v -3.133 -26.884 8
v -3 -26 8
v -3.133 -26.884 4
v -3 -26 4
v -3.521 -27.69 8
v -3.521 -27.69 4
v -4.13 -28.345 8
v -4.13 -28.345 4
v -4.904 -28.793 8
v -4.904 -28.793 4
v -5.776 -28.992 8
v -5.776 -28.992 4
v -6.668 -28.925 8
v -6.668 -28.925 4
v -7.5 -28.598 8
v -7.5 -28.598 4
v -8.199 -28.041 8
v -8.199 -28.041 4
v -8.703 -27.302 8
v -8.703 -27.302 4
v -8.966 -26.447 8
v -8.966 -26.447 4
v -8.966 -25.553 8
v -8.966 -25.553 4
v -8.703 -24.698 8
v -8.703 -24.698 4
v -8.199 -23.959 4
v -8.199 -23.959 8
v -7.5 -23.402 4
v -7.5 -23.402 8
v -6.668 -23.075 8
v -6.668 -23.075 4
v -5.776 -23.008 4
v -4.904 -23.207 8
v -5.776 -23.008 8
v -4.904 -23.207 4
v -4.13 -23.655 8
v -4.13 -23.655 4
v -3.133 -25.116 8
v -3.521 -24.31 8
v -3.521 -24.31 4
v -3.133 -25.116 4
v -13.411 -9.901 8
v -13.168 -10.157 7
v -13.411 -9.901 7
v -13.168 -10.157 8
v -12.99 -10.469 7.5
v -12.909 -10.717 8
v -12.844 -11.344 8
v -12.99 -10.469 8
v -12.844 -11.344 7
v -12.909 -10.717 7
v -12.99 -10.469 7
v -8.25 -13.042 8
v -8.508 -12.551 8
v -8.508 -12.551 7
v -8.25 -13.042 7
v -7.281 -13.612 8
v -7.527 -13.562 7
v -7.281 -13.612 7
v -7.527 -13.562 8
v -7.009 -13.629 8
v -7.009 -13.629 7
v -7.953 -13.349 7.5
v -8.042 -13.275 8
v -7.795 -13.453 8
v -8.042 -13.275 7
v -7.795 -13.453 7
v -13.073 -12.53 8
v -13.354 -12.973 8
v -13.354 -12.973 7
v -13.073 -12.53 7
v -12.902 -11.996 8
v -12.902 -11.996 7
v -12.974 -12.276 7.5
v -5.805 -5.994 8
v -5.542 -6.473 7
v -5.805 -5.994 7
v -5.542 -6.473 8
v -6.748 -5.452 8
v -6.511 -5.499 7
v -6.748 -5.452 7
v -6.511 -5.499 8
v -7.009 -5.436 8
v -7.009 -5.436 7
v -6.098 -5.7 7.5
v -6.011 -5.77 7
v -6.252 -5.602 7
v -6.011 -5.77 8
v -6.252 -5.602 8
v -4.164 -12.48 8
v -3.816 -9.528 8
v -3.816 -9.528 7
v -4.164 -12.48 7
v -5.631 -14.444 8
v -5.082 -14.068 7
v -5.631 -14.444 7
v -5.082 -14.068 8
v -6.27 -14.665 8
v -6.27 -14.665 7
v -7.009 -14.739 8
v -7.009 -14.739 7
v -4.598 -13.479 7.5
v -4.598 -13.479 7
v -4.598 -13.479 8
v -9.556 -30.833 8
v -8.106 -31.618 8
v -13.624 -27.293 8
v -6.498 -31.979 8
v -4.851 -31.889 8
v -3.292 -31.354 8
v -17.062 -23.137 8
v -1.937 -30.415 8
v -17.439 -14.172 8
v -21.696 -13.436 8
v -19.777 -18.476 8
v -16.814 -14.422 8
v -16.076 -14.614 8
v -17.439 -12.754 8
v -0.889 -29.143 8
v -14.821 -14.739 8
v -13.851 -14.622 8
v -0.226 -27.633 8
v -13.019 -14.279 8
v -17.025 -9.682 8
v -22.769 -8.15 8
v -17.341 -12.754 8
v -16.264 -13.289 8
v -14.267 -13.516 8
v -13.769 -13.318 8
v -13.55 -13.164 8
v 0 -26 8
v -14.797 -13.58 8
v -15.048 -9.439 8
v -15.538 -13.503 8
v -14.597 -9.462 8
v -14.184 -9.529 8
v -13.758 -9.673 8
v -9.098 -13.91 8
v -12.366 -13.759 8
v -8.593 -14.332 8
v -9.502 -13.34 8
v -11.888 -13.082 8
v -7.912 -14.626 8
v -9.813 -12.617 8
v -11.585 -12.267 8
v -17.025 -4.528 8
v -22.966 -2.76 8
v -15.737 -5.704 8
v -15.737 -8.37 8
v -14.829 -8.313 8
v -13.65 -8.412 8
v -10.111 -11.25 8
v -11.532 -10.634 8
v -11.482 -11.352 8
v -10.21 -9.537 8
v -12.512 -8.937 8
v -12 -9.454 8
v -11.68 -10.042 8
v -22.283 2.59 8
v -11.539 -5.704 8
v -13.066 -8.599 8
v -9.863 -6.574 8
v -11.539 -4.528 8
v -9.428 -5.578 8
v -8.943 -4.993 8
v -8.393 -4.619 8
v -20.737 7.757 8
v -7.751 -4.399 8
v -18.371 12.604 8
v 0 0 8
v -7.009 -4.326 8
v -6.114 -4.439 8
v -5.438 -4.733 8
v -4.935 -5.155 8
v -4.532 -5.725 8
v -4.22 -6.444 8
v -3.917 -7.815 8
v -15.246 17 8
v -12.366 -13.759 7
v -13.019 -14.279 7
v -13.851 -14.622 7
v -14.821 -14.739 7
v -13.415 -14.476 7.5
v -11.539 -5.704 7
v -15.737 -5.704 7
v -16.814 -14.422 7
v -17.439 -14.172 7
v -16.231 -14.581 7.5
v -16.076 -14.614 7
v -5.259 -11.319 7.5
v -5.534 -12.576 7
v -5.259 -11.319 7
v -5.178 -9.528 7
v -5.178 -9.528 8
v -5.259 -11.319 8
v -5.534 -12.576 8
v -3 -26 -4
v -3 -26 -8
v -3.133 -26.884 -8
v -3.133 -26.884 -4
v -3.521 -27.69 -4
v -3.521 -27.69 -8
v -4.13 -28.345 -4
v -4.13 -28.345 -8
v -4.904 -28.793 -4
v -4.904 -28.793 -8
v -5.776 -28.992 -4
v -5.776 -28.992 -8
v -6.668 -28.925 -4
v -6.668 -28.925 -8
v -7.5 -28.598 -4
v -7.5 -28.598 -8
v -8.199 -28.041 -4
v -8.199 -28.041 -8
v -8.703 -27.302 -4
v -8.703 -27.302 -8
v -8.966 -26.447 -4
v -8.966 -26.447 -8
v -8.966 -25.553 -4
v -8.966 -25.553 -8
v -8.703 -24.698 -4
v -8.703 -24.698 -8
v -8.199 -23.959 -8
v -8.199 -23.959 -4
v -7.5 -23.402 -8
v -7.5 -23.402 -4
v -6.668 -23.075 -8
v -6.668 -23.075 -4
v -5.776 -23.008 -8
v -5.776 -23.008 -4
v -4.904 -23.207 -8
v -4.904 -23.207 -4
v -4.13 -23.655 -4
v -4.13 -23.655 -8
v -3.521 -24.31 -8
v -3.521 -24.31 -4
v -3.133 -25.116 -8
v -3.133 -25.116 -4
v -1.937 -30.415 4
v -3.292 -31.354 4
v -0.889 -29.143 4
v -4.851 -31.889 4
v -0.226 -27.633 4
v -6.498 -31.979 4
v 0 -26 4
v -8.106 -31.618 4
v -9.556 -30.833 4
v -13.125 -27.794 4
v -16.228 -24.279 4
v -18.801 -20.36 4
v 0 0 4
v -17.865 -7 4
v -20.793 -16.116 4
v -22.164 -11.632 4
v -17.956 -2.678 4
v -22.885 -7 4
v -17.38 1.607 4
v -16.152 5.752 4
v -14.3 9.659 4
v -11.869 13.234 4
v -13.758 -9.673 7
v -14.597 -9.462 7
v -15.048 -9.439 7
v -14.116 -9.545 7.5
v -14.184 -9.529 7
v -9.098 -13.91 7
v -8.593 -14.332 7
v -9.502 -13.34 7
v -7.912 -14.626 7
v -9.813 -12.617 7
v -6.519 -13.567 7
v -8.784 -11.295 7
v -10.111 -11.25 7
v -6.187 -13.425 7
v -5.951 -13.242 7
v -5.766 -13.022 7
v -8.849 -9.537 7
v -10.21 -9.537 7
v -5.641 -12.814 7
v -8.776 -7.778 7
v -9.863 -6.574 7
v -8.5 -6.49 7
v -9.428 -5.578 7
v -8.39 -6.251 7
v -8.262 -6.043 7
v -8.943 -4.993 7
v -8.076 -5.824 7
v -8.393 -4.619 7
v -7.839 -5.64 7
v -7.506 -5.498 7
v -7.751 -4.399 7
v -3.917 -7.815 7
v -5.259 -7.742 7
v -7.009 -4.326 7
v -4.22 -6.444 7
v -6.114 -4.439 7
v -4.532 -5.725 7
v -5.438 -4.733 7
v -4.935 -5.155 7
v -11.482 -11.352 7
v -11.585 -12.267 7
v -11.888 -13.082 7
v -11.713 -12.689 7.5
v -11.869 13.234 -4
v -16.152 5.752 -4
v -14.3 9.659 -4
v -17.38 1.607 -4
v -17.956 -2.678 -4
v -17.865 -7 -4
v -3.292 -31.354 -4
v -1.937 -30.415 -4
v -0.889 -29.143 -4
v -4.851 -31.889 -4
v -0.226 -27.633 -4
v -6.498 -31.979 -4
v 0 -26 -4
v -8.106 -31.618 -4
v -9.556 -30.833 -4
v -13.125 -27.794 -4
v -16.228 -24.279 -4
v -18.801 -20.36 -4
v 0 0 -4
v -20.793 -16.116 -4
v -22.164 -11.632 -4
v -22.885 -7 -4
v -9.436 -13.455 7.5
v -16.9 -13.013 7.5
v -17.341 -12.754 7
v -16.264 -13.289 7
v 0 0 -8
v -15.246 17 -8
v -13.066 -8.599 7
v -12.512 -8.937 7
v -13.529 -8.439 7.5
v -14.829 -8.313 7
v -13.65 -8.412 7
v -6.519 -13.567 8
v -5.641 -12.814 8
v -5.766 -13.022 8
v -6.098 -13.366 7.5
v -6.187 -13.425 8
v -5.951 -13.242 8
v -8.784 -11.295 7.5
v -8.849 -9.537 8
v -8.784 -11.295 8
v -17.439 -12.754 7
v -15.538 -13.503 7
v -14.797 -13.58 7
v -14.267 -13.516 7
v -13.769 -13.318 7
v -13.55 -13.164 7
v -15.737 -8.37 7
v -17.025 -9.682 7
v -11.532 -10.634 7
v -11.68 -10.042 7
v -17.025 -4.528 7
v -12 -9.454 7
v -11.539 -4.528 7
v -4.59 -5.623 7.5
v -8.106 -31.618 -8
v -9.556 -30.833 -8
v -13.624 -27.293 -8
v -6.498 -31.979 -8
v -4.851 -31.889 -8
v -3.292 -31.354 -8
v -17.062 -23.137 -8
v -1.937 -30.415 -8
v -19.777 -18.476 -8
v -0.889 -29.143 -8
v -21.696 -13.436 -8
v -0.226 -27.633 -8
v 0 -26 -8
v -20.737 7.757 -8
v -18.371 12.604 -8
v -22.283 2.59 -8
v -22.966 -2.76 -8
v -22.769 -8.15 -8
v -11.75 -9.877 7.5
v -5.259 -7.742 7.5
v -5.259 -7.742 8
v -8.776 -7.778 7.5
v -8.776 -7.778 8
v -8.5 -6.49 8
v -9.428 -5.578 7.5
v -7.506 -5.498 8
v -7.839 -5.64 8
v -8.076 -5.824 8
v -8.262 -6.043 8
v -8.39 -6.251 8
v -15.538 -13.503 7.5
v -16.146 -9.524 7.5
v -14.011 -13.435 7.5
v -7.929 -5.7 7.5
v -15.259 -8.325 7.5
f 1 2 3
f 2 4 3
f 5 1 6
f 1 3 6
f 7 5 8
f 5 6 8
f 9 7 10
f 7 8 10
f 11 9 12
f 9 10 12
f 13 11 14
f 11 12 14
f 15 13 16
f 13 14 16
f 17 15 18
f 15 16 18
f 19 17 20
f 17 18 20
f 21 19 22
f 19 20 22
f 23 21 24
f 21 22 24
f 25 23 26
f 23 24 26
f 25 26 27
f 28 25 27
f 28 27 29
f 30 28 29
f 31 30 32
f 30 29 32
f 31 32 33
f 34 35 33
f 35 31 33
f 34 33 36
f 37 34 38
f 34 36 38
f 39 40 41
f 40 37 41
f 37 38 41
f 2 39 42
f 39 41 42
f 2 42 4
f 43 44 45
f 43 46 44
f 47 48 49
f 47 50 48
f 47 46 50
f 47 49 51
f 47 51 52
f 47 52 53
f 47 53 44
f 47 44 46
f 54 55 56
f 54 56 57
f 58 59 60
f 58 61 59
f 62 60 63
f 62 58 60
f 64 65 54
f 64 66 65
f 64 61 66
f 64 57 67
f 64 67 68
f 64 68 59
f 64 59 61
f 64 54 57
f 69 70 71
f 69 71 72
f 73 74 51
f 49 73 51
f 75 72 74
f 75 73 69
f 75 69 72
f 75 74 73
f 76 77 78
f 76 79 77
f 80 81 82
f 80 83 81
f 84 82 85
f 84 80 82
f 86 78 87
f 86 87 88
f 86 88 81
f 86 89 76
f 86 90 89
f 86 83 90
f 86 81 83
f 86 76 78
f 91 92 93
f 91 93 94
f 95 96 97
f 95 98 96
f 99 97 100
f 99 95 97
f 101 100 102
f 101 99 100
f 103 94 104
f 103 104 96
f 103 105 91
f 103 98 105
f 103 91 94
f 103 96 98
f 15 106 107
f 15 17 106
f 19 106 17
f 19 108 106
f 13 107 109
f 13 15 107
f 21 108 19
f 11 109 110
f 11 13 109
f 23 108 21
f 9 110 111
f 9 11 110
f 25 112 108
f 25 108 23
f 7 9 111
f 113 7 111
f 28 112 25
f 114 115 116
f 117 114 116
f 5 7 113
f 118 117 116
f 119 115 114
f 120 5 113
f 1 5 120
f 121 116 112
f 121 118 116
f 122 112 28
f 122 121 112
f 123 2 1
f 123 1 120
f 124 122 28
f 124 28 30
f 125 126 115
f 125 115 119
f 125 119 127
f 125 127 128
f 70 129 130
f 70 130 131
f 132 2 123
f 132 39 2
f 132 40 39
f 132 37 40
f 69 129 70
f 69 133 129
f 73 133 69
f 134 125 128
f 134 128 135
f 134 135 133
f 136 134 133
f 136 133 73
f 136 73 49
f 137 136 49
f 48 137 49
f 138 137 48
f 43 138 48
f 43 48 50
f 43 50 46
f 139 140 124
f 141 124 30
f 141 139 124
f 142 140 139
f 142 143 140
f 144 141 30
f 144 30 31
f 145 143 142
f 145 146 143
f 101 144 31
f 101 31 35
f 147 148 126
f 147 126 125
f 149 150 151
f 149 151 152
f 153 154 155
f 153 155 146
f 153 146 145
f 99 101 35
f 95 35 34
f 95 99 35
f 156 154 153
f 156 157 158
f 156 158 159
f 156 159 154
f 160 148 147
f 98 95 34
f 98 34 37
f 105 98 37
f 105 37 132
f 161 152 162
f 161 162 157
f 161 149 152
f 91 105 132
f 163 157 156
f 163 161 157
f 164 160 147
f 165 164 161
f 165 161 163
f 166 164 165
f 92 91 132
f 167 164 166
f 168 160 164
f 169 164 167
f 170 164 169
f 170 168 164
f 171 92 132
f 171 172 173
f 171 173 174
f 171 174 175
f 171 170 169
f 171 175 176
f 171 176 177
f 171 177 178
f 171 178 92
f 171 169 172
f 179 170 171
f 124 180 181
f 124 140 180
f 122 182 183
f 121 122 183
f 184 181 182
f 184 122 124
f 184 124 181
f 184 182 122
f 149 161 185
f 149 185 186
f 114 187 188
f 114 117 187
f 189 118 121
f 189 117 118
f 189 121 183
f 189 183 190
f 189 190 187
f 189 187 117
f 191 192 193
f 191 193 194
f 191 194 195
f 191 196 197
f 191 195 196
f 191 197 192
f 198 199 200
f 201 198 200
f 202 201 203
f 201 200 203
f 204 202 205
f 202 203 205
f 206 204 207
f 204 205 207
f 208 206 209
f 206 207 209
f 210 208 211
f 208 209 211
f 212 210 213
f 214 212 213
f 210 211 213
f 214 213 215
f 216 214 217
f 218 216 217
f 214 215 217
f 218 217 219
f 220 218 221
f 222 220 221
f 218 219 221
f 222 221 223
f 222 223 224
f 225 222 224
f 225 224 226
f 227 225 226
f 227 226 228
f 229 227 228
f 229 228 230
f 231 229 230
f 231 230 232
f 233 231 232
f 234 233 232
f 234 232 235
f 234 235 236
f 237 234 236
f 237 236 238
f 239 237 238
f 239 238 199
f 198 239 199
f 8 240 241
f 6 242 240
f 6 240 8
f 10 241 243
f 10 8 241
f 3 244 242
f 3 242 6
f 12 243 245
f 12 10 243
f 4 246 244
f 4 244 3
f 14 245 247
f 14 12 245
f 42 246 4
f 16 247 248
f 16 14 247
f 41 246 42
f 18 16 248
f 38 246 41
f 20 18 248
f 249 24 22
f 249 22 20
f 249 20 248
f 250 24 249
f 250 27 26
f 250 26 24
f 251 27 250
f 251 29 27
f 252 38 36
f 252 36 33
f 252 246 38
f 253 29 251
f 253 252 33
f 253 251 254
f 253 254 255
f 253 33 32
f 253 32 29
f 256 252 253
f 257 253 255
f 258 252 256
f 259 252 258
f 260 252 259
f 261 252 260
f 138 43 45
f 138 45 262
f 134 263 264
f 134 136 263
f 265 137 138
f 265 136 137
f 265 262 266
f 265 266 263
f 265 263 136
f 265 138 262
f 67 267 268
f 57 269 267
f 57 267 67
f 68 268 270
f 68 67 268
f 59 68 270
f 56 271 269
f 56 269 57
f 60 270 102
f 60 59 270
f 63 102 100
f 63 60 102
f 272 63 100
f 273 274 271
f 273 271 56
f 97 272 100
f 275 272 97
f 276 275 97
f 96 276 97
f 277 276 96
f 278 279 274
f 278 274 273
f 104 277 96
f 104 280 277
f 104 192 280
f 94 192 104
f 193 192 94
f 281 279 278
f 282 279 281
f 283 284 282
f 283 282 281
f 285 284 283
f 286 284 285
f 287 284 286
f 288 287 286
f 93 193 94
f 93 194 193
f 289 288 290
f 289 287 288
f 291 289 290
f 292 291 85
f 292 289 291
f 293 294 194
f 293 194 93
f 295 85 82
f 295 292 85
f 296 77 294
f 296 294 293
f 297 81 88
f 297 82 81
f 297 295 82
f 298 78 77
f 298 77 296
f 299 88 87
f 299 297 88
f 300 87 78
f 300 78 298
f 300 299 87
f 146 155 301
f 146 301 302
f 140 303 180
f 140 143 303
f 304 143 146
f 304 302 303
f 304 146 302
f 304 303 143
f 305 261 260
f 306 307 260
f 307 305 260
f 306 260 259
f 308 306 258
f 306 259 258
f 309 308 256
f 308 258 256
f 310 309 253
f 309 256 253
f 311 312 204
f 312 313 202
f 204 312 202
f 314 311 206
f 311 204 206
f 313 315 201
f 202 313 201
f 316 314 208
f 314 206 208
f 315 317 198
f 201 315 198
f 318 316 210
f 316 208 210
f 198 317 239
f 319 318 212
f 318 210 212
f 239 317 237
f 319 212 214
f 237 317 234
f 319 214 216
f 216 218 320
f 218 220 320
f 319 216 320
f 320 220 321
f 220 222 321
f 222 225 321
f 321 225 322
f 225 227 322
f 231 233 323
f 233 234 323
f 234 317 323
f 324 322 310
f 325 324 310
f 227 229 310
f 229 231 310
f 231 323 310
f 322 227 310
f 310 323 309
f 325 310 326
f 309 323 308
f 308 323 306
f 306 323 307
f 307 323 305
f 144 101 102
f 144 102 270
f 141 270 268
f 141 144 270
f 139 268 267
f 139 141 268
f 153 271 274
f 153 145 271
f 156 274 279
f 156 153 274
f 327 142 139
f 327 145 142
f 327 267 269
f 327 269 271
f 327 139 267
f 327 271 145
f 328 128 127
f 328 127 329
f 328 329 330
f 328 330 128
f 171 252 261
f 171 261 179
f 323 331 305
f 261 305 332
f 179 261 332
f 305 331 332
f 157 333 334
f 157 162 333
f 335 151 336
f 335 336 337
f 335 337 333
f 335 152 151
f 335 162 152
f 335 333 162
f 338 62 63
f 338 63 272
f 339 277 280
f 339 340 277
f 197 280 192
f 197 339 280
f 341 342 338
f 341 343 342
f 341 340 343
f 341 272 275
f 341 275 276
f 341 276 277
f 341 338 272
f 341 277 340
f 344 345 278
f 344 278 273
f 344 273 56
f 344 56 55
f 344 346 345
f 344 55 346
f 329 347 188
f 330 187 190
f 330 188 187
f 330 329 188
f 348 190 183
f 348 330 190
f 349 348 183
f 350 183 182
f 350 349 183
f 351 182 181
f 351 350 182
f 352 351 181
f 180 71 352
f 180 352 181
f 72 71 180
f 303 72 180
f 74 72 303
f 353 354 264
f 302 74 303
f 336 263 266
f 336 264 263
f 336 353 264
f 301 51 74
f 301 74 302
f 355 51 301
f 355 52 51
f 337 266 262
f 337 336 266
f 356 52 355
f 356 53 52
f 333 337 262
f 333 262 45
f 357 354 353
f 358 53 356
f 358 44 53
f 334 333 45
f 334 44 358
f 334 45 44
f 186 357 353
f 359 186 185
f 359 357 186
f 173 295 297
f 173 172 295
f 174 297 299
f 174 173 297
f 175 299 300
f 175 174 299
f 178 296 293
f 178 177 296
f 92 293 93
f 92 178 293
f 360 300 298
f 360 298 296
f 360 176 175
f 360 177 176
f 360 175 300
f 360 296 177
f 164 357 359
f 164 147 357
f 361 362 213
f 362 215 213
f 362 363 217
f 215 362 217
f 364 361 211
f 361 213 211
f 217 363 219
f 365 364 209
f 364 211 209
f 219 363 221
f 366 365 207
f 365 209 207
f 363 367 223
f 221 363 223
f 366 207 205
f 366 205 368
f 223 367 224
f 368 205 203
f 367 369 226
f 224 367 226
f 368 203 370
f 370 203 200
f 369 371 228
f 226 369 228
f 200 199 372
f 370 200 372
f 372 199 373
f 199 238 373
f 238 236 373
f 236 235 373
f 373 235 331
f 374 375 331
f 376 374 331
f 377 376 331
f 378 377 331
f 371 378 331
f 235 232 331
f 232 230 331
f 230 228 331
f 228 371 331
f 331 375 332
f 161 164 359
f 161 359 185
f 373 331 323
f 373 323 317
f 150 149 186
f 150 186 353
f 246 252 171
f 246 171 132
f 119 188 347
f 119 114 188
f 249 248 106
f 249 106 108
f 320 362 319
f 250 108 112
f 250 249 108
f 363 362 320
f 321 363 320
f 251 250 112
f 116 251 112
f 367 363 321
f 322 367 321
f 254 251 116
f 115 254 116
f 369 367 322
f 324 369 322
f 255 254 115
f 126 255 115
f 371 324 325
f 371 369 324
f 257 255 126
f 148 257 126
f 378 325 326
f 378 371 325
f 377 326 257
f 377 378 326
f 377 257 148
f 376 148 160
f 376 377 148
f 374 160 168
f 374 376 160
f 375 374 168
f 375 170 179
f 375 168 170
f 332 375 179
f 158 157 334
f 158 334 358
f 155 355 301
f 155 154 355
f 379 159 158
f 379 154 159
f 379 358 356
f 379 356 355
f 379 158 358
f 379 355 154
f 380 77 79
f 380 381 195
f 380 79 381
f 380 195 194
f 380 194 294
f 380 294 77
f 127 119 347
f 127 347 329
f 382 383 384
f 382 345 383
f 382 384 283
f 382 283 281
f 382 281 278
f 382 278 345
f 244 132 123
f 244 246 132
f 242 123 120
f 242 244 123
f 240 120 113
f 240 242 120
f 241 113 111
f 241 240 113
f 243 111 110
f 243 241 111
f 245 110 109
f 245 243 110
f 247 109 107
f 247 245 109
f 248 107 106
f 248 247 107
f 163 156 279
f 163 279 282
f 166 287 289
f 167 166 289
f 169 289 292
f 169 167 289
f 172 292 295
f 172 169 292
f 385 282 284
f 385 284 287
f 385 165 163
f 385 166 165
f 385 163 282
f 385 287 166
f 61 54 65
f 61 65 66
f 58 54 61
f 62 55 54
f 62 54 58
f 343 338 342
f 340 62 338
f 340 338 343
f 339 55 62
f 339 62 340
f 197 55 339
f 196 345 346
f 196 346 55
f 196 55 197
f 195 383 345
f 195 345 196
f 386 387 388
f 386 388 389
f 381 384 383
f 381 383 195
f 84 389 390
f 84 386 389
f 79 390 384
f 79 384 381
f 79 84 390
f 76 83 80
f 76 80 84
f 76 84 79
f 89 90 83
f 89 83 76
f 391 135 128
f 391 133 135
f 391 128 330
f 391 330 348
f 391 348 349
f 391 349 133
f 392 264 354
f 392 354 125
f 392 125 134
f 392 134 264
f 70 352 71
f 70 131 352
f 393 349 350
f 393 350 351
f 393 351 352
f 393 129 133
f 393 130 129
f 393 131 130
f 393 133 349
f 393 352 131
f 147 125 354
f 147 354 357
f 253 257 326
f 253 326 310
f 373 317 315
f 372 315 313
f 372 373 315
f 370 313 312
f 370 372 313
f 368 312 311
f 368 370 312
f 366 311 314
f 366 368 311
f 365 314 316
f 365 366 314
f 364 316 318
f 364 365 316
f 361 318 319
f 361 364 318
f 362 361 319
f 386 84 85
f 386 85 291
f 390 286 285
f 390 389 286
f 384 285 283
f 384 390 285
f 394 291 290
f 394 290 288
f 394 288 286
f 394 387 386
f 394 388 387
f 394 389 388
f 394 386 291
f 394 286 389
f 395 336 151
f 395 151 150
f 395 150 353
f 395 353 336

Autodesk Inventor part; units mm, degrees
ref_plane "YZ Plane" through (0, 0, 0) normal (1, 0, 0) x (0, 1, 0)
ref_plane "XZ Plane" through (0, 0, 0) normal (0, 1, 0) x (-1, 0, 0)
sketch "스케치1" plane through (0, 0, 0) normal (0, 0, 1) x (1, 0, 0)
  line L0 (0, 0) -> (0, -26)
  line L1 (0, 0) -> (26, 0) construction
  arc A0 (-9.5556, -30.833) -> (0, -26) centre (-6, -26) ccw
  line L2 (0, 0) -> (-15.2463, 17)
  arc A1 (-15.2463, 17) -> (-9.5556, -30.833) centre (10, -4.2514) ccw
  circle A2 centre (-6, -26) radius 3
  dimension "d1" = 26
  dimension "d3" = 26
  dimension "d5" = 43
  dimension "d6" = 23
  dimension "d7" = 33
  dimension "d8" = 6
  dimension "d9" = 6
extrude "돌출1" add sketch "스케치1" along normal mid plane 16
ref_plane "작업 평면1" through (0, 0, 0) normal (0, 0, -1) x (-1, 0, 0)
sketch "스케치2" plane through (0, 0, 0) normal (0, 0, -1) x (-1, 0, 0)
  arc A0 (9.5556, -30.833) -> (15.2463, 17) centre (-10, -4.2514) ccw projected
  line L0 (22.8853, -7) -> (17.8648, -7)
  line L1 (0, 0) -> (0, -26) projected
  circle A1 centre (6, -26) radius 3 projected
  arc A2 (17.8648, -7) -> (11.869, 13.2342) centre (-10, -4.2514) ccw
  line L2 (15.2463, 17) -> (0, 0) projected
  arc A3 (0, -26) -> (9.5556, -30.833) centre (6, -26) ccw projected
  dimension "d14" = 19
extrude "돌출2" cut sketch "스케치2" along normal mid plane 8 contours A3 L1 L2 A2 L0 A0
sketch "스케치6" plane through (0, 0, 8) normal (0, 0, 1) x (1, 0, 0)
  line L0 (-18.2733, -4.3259) -> (-3.2652, -4.3259) construction
  line L1 (-3.2652, -4.3259) -> (-3.2652, -14.7392) construction
  line L2 (-3.2652, -14.7392) -> (-18.2733, -14.7392) construction
  line L3 (-18.2733, -14.7392) -> (-18.2733, -4.3259) construction
  spline S0 degree 2 poles (-11.4824, -11.3519) (-11.4824, -12.0731) (-11.9443, -13.3049) (-12.3657, -13.7587) knots 0 0 0 1 2 2 2
  spline S1 degree 2 poles (-12.3657, -13.7587) (-12.7871, -14.2125) (-14.0432, -14.7392) (-14.8212, -14.7392) knots 0 0 0 1 2 2 2
  spline S2 degree 2 poles (-14.8212, -14.7392) (-15.5343, -14.7392) (-16.9281, -14.4232) (-17.4387, -14.172) knots 0 0 0 1 2 2 2
  line L4 (-17.4387, -14.172) -> (-17.4387, -12.7538)
  line L5 (-17.4387, -12.7538) -> (-17.3414, -12.7538)
  spline S3 degree 2 poles (-17.3414, -12.7538) (-17.1874, -12.8673) (-16.6121, -13.159) (-16.2636, -13.2887) knots 0 0 0 1 2 2 2
  spline S4 degree 2 poles (-16.2636, -13.2887) (-15.8665, -13.4264) (-15.2101, -13.5804) (-14.7968, -13.5804) knots 0 0 0 1 2 2 2
  spline S5 degree 2 poles (-14.7968, -13.5804) (-14.3917, -13.5804) (-13.6299, -13.2887) (-13.3544, -12.9726) knots 0 0 0 1 2 2 2
  spline S6 degree 2 poles (-13.3544, -12.9726) (-13.1032, -12.6728) (-12.8439, -11.8786) (-12.8439, -11.3438) knots 0 0 0 1 2 2 2
  spline S7 degree 2 poles (-12.8439, -11.3438) (-12.8439, -10.8089) (-13.1356, -10.1282) (-13.4111, -9.9013) knots 0 0 0 1 2 2 2
  spline S8 degree 2 poles (-13.4111, -9.9013) (-13.6947, -9.6501) (-14.5375, -9.4394) (-15.0481, -9.4394) knots 0 0 0 1 2 2 2
  spline S9 degree 2 poles (-15.0481, -9.4394) (-15.5991, -9.4394) (-16.6931, -9.6096) (-17.0254, -9.6825) knots 0 0 0 1 2 2 2
  line L6 (-17.0254, -9.6825) -> (-17.0254, -4.5285)
  line L7 (-17.0254, -4.5285) -> (-11.5392, -4.5285)
  line L8 (-11.5392, -4.5285) -> (-11.5392, -5.7036)
  line L9 (-11.5392, -5.7036) -> (-15.7369, -5.7036)
  line L10 (-15.7369, -5.7036) -> (-15.7369, -8.3697)
  spline S10 degree 2 poles (-15.7369, -8.3697) (-15.4938, -8.3373) (-15.0238, -8.313) (-14.8293, -8.313) knots 0 0 0 1 2 2 2
  spline S11 degree 2 poles (-14.8293, -8.313) (-14.0594, -8.313) (-12.9978, -8.5642) (-12.5116, -8.937) knots 0 0 0 1 2 2 2
  spline S12 degree 2 poles (-12.5116, -8.937) (-12.0173, -9.3097) (-11.4824, -10.4442) (-11.4824, -11.3519) knots 0 0 0 1 2 2 2
  spline S13 degree 2 poles (-3.8163, -9.5285) (-3.8163, -12.219) (-5.3803, -14.7392) (-7.0092, -14.7392) knots 0 0 0 1 2 2 2
  spline S14 degree 2 poles (-7.0092, -14.7392) (-8.6623, -14.7392) (-10.2101, -12.1703) (-10.2101, -9.5366) knots 0 0 0 1 2 2 2
  spline S15 degree 2 poles (-10.2101, -9.5366) (-10.2101, -6.83) (-8.6461, -4.3259) (-7.0092, -4.3259) knots 0 0 0 1 2 2 2
  spline S16 degree 2 poles (-7.0092, -4.3259) (-5.3641, -4.3259) (-3.8163, -6.9191) (-3.8163, -9.5285) knots 0 0 0 1 2 2 2
  spline S17 degree 2 poles (-5.5343, -12.5755) (-5.3398, -12.0812) (-5.1777, -10.5577) (-5.1777, -9.5285) knots 0 0 0 1 2 2 2
  spline S18 degree 2 poles (-5.1777, -9.5285) (-5.1777, -8.4994) (-5.3398, -6.984) (-5.5424, -6.4734) knots 0 0 0 1 2 2 2
  spline S19 degree 2 poles (-5.5424, -6.4734) (-5.745, -5.9629) (-6.45, -5.4361) (-7.0092, -5.4361) knots 0 0 0 1 2 2 2
  spline S20 degree 2 poles (-7.0092, -5.4361) (-7.5683, -5.4361) (-8.2896, -5.9629) (-8.5003, -6.4896) knots 0 0 0 1 2 2 2
  spline S21 degree 2 poles (-8.5003, -6.4896) (-8.7028, -7.0002) (-8.8487, -8.5561) (-8.8487, -9.5366) knots 0 0 0 1 2 2 2
  spline S22 degree 2 poles (-8.8487, -9.5366) (-8.8487, -10.5901) (-8.7191, -12.0002) (-8.5084, -12.5512) knots 0 0 0 1 2 2 2
  spline S23 degree 2 poles (-8.5084, -12.5512) (-8.3139, -13.0699) (-7.5926, -13.629) (-7.0092, -13.629) knots 0 0 0 1 2 2 2
  spline S24 degree 2 poles (-7.0092, -13.629) (-6.4581, -13.629) (-5.7369, -13.1023) (-5.5343, -12.5755) knots 0 0 0 1 2 2 2
  point P0 (0, 0)
extrude "돌출3" cut sketch "스케치6" against normal blind 1
properties part number "05-1"
